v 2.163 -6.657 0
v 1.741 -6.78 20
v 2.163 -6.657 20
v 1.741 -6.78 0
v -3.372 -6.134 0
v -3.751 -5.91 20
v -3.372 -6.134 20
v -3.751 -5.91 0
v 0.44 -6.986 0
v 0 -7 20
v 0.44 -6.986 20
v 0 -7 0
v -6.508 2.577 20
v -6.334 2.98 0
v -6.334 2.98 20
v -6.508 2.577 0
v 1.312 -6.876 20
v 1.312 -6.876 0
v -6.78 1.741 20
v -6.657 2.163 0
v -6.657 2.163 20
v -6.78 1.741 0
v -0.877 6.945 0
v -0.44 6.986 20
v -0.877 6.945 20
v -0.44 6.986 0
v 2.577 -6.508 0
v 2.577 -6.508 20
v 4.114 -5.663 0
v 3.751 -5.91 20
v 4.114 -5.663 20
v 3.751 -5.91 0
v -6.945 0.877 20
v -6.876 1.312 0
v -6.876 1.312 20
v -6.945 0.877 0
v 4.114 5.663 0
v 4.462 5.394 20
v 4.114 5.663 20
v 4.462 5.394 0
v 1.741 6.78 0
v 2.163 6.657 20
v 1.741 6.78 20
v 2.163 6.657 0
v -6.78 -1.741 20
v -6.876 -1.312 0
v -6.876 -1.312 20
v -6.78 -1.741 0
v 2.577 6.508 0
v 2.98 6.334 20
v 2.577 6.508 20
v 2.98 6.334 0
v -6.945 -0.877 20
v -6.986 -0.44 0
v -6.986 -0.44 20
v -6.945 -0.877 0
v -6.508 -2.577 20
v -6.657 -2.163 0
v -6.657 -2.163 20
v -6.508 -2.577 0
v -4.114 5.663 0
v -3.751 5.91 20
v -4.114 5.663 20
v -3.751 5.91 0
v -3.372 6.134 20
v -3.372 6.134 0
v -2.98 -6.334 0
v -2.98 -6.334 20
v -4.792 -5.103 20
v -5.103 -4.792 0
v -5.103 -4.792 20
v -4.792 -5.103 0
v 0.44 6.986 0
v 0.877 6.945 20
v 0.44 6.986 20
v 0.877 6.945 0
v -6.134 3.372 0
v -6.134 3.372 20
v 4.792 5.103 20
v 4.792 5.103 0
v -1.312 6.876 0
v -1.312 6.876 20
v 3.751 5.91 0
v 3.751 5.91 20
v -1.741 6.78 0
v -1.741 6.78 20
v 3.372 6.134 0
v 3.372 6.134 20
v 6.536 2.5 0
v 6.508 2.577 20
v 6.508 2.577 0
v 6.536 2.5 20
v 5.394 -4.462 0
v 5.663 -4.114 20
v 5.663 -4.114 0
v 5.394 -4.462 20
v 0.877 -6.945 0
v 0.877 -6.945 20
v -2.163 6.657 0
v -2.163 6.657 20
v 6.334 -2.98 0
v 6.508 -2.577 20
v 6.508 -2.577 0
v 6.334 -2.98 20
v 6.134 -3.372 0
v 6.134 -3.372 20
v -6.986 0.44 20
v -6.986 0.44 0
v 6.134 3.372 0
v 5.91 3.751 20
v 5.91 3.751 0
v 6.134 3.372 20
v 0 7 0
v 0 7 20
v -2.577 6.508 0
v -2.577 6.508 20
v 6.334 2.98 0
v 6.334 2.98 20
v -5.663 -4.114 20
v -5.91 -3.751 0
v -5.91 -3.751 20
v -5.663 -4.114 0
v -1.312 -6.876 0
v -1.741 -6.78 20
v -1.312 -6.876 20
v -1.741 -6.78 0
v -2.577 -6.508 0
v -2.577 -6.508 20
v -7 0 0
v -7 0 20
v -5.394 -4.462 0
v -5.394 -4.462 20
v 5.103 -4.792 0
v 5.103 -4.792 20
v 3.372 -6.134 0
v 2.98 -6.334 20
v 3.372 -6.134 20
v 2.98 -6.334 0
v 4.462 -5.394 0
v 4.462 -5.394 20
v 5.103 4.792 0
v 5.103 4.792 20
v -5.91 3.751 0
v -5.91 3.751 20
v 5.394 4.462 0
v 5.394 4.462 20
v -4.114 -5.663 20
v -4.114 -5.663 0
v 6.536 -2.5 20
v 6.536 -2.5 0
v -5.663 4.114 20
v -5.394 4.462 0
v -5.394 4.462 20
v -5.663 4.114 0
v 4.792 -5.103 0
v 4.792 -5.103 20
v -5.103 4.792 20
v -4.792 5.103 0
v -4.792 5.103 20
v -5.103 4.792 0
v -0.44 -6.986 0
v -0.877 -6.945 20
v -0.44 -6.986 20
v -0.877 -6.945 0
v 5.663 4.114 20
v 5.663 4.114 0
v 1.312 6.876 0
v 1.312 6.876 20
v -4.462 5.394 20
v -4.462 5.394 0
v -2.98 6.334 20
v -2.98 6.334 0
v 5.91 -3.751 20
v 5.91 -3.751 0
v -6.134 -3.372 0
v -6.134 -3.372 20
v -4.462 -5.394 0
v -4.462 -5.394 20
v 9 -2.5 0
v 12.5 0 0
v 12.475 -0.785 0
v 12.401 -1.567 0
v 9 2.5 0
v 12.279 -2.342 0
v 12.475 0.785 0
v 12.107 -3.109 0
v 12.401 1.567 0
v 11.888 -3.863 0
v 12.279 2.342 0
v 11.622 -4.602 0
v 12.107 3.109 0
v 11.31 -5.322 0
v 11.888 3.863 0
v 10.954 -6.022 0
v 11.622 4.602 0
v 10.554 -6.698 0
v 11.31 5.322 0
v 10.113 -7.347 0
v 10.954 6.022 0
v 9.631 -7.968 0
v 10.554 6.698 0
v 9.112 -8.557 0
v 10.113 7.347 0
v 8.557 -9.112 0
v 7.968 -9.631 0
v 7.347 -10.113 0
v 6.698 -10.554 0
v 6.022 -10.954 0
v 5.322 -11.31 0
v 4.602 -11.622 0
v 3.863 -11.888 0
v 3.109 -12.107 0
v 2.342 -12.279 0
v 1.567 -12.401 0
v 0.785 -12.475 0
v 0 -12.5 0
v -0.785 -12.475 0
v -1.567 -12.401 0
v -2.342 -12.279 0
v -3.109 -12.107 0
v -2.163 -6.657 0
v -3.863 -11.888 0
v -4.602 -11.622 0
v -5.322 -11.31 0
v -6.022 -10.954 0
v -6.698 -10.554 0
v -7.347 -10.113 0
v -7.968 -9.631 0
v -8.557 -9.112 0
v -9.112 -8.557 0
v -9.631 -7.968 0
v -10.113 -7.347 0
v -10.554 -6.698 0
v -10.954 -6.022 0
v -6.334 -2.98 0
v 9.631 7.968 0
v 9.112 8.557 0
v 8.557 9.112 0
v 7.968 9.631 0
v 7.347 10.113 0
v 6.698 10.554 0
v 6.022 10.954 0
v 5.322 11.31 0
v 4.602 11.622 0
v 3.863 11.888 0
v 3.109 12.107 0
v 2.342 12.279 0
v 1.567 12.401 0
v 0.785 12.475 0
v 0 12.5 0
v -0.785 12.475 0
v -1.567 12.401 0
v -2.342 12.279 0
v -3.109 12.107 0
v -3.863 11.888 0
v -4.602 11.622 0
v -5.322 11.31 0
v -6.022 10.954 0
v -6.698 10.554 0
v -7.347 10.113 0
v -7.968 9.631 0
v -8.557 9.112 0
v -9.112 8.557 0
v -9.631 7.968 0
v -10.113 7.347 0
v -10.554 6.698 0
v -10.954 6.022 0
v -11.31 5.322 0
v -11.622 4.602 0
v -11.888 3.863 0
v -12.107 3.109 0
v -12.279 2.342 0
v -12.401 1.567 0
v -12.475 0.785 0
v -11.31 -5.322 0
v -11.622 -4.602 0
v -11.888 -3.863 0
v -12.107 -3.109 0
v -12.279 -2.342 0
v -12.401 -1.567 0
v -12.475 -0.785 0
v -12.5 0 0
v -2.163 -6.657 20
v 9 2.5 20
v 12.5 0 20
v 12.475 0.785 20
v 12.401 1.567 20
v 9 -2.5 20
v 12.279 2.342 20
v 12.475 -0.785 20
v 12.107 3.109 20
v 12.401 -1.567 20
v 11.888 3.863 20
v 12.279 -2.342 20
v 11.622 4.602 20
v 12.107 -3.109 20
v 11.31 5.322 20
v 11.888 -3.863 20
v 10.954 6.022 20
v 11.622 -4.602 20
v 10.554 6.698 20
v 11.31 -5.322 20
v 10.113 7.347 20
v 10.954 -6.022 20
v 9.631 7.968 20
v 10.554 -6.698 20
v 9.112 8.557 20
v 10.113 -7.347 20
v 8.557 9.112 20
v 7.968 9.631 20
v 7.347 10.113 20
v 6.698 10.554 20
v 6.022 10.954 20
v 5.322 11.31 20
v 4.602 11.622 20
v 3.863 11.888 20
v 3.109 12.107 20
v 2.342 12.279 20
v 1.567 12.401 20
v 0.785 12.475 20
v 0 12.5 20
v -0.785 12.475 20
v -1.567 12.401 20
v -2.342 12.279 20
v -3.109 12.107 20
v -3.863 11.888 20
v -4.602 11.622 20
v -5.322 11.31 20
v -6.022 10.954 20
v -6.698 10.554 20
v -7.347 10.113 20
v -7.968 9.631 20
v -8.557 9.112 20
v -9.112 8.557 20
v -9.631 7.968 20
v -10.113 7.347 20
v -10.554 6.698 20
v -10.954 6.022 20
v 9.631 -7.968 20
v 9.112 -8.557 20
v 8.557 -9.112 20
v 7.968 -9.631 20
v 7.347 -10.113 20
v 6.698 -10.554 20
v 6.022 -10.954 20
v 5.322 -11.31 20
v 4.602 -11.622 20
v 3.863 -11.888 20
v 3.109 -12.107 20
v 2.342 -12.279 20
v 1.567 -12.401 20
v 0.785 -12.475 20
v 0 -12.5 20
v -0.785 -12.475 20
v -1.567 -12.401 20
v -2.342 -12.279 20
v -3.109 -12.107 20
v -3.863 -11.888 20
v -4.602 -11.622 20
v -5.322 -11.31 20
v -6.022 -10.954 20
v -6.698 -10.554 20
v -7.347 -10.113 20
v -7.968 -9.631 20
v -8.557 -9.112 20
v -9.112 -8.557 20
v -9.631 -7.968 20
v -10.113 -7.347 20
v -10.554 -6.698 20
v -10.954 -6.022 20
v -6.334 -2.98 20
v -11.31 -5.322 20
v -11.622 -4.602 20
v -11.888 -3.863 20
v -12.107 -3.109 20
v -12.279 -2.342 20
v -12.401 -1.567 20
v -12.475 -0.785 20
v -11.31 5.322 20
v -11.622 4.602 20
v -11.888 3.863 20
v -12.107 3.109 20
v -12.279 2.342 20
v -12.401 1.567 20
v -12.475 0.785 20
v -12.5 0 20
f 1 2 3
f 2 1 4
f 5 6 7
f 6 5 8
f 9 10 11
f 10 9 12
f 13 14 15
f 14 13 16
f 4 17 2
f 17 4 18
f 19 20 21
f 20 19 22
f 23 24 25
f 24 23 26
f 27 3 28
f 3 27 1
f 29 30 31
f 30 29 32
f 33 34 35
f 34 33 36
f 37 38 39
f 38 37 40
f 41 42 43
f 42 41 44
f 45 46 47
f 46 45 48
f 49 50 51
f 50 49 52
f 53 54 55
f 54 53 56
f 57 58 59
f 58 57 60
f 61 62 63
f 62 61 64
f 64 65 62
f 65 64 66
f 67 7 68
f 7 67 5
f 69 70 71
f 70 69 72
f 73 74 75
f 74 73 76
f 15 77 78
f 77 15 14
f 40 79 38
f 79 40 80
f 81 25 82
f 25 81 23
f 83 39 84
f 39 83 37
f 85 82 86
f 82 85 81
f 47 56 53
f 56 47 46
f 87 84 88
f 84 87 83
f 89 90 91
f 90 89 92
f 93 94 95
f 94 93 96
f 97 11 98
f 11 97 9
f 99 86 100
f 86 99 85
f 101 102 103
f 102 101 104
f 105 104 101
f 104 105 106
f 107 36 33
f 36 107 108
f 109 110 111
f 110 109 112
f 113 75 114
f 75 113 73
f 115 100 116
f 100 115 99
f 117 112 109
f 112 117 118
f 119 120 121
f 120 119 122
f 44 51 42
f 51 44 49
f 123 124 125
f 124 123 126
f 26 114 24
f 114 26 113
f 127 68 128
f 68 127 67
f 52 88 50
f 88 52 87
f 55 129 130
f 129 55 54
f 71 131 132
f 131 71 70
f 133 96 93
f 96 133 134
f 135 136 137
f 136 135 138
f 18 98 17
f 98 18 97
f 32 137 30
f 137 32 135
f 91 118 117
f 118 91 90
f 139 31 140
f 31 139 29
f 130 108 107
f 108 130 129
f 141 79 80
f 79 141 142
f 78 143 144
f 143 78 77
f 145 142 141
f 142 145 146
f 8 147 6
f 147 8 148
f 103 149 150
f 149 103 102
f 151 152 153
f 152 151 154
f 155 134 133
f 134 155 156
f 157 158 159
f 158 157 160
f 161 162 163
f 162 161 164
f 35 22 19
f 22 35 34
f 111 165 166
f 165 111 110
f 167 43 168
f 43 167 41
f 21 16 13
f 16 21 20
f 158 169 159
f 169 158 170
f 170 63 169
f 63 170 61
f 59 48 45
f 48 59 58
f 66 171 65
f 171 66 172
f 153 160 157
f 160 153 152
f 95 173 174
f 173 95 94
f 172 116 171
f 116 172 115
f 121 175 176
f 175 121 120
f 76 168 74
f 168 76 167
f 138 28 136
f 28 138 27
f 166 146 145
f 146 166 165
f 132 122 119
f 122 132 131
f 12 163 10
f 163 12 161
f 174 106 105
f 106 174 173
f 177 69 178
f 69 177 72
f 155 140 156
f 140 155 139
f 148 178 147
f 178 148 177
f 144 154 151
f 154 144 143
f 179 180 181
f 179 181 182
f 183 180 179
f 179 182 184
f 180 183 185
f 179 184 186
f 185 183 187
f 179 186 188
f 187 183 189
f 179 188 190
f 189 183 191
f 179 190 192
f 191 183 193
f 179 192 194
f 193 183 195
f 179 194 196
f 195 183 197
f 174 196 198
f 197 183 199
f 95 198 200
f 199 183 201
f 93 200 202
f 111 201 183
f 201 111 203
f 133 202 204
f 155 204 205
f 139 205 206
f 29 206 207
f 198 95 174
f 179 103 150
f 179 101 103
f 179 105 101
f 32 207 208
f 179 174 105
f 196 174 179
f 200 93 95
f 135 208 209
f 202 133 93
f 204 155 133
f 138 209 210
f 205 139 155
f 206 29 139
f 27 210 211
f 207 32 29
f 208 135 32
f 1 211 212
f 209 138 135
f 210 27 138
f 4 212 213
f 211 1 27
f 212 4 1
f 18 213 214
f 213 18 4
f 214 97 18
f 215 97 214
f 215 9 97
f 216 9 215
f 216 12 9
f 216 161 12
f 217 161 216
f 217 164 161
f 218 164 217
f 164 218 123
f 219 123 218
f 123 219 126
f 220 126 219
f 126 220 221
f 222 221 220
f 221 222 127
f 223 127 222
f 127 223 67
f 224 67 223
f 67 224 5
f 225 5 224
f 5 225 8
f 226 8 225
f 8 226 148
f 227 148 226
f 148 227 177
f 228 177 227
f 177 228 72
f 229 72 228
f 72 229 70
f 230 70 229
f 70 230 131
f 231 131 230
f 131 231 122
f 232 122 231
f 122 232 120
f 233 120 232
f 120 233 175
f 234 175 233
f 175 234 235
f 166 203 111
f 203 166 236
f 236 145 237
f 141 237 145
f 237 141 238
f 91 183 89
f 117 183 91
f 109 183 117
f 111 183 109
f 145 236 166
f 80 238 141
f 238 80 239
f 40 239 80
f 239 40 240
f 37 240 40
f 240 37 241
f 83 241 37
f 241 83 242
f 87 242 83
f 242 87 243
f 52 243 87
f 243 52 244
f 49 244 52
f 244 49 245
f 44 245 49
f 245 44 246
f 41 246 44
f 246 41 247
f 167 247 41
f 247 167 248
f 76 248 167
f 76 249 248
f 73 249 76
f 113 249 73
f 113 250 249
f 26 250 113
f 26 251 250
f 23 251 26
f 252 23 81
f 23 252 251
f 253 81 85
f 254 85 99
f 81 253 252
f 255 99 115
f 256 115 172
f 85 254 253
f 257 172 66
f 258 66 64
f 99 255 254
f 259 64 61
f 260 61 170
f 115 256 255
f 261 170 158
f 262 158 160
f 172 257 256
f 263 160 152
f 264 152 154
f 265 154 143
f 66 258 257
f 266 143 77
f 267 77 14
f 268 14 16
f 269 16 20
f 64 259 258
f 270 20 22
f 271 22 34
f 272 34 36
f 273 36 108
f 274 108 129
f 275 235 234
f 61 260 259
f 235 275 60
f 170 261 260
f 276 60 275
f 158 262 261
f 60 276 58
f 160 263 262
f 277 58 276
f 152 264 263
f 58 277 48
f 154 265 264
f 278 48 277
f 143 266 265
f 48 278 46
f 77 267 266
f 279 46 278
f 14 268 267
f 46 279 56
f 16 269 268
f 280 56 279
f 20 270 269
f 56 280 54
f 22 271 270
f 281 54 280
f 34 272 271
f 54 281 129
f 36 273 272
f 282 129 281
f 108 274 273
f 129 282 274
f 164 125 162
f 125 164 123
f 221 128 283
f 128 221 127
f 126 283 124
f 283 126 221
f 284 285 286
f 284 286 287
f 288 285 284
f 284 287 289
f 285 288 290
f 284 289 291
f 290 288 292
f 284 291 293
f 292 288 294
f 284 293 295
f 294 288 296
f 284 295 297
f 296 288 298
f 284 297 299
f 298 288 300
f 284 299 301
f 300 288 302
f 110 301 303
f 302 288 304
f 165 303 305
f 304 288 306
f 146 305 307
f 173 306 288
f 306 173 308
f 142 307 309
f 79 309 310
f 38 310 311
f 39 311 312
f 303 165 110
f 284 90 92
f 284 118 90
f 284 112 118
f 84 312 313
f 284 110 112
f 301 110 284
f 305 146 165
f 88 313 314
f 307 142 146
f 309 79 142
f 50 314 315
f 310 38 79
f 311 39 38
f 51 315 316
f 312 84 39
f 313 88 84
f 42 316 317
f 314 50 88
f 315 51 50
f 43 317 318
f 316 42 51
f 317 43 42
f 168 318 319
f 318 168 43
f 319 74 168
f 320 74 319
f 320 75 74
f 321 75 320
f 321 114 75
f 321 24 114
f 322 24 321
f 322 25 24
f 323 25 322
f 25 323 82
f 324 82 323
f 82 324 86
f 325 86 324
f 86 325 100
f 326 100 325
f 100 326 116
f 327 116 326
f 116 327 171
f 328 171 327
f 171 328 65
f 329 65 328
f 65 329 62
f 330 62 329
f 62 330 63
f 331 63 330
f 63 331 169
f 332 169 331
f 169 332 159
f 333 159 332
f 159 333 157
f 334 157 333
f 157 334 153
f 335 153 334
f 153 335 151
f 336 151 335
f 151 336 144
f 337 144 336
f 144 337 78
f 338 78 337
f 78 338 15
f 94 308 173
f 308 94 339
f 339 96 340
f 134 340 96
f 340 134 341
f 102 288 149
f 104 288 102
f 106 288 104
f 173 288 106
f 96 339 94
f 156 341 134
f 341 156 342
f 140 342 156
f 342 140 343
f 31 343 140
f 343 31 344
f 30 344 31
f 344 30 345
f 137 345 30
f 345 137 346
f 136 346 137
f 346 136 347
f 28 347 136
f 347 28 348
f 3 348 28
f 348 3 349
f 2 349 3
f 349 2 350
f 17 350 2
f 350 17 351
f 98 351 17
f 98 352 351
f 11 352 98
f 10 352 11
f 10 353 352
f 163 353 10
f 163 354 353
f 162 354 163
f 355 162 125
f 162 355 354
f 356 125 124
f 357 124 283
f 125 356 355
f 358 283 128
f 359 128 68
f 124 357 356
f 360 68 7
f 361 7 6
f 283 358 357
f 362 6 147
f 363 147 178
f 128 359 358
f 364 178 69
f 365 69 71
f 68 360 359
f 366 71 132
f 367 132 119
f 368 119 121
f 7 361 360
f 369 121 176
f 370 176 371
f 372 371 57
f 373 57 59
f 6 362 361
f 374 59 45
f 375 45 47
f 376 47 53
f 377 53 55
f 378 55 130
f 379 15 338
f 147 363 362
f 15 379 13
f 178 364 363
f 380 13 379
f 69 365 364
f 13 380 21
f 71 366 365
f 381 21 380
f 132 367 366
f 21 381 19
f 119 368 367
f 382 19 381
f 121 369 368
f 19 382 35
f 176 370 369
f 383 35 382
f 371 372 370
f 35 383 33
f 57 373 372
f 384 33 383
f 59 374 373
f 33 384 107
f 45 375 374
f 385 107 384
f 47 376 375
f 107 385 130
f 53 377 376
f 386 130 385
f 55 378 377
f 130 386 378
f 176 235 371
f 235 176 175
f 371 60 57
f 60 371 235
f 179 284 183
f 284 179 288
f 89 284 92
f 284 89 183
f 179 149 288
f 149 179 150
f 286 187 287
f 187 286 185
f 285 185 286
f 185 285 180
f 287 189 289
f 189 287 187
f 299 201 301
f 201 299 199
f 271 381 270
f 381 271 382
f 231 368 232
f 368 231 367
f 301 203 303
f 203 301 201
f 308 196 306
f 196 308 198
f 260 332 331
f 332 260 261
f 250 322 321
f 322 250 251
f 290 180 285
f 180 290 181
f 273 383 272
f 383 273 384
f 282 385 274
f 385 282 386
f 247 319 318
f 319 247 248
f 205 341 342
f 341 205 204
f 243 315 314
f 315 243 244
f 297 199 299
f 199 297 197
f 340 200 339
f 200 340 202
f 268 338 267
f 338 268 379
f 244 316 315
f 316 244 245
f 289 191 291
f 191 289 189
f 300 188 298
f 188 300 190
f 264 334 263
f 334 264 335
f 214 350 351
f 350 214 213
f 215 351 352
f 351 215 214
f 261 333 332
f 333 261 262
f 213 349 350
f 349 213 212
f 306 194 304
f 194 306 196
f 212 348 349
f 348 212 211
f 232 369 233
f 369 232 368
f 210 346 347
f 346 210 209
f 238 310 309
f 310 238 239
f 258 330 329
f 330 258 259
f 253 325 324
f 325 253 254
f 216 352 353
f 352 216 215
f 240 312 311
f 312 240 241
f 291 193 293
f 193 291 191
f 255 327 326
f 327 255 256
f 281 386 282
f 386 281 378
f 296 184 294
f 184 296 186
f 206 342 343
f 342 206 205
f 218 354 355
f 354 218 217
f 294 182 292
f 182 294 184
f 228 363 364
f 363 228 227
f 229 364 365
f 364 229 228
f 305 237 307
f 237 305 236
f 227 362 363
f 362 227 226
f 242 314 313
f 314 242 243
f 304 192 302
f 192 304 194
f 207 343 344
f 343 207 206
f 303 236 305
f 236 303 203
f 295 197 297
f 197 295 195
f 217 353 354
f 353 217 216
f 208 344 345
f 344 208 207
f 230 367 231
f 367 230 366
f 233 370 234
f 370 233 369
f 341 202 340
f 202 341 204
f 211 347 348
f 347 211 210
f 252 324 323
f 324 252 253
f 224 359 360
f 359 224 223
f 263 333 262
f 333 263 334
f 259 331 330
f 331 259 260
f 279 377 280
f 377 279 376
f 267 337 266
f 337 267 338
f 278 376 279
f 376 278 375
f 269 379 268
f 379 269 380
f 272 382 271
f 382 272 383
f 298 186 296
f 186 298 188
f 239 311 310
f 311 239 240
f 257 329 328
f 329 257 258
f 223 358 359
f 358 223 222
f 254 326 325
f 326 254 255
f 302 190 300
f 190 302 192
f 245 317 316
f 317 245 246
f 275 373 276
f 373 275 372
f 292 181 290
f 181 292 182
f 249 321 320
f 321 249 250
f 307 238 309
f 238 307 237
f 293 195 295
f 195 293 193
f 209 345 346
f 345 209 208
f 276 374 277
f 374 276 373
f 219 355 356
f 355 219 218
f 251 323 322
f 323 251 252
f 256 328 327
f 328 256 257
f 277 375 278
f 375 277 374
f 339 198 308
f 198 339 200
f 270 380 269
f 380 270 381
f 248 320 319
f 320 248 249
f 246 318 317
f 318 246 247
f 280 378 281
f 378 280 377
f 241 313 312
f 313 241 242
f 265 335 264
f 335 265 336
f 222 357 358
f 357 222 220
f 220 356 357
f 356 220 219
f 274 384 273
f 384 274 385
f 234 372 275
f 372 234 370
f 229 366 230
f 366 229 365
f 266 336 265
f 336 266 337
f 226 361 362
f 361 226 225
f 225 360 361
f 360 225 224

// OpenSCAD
/*
Copyright Dr. Mrs. The Mistress 2020.
This documentation describes Open Hardware and is licensed under the CERN OHL v. 1.2.

You may redistribute and modify this documentation under the terms of the
CERN OHL v.1.2. (http://ohwr.org/cernohl). This documentation is distributed
WITHOUT   ANY   EXPRESS   OR   IMPLIED   WARRANTY,   INCLUDING   OF
MERCHANTABILITY,   SATISFACTORY   QUALITY   AND   FITNESS   FOR   A
PARTICULAR   PURPOSE.   Please   see   the   CERN   OHL   v.1.2  for   applicable
conditions.
*/

difference() {
    cylinder(d=25, h=20, $fn=100);

    union() {
        cylinder(d=14, h=20, $fn=100);
        translate([((14/2)-5)+2,-2.5,0])
        cube([5,5,20]);
    }
}
